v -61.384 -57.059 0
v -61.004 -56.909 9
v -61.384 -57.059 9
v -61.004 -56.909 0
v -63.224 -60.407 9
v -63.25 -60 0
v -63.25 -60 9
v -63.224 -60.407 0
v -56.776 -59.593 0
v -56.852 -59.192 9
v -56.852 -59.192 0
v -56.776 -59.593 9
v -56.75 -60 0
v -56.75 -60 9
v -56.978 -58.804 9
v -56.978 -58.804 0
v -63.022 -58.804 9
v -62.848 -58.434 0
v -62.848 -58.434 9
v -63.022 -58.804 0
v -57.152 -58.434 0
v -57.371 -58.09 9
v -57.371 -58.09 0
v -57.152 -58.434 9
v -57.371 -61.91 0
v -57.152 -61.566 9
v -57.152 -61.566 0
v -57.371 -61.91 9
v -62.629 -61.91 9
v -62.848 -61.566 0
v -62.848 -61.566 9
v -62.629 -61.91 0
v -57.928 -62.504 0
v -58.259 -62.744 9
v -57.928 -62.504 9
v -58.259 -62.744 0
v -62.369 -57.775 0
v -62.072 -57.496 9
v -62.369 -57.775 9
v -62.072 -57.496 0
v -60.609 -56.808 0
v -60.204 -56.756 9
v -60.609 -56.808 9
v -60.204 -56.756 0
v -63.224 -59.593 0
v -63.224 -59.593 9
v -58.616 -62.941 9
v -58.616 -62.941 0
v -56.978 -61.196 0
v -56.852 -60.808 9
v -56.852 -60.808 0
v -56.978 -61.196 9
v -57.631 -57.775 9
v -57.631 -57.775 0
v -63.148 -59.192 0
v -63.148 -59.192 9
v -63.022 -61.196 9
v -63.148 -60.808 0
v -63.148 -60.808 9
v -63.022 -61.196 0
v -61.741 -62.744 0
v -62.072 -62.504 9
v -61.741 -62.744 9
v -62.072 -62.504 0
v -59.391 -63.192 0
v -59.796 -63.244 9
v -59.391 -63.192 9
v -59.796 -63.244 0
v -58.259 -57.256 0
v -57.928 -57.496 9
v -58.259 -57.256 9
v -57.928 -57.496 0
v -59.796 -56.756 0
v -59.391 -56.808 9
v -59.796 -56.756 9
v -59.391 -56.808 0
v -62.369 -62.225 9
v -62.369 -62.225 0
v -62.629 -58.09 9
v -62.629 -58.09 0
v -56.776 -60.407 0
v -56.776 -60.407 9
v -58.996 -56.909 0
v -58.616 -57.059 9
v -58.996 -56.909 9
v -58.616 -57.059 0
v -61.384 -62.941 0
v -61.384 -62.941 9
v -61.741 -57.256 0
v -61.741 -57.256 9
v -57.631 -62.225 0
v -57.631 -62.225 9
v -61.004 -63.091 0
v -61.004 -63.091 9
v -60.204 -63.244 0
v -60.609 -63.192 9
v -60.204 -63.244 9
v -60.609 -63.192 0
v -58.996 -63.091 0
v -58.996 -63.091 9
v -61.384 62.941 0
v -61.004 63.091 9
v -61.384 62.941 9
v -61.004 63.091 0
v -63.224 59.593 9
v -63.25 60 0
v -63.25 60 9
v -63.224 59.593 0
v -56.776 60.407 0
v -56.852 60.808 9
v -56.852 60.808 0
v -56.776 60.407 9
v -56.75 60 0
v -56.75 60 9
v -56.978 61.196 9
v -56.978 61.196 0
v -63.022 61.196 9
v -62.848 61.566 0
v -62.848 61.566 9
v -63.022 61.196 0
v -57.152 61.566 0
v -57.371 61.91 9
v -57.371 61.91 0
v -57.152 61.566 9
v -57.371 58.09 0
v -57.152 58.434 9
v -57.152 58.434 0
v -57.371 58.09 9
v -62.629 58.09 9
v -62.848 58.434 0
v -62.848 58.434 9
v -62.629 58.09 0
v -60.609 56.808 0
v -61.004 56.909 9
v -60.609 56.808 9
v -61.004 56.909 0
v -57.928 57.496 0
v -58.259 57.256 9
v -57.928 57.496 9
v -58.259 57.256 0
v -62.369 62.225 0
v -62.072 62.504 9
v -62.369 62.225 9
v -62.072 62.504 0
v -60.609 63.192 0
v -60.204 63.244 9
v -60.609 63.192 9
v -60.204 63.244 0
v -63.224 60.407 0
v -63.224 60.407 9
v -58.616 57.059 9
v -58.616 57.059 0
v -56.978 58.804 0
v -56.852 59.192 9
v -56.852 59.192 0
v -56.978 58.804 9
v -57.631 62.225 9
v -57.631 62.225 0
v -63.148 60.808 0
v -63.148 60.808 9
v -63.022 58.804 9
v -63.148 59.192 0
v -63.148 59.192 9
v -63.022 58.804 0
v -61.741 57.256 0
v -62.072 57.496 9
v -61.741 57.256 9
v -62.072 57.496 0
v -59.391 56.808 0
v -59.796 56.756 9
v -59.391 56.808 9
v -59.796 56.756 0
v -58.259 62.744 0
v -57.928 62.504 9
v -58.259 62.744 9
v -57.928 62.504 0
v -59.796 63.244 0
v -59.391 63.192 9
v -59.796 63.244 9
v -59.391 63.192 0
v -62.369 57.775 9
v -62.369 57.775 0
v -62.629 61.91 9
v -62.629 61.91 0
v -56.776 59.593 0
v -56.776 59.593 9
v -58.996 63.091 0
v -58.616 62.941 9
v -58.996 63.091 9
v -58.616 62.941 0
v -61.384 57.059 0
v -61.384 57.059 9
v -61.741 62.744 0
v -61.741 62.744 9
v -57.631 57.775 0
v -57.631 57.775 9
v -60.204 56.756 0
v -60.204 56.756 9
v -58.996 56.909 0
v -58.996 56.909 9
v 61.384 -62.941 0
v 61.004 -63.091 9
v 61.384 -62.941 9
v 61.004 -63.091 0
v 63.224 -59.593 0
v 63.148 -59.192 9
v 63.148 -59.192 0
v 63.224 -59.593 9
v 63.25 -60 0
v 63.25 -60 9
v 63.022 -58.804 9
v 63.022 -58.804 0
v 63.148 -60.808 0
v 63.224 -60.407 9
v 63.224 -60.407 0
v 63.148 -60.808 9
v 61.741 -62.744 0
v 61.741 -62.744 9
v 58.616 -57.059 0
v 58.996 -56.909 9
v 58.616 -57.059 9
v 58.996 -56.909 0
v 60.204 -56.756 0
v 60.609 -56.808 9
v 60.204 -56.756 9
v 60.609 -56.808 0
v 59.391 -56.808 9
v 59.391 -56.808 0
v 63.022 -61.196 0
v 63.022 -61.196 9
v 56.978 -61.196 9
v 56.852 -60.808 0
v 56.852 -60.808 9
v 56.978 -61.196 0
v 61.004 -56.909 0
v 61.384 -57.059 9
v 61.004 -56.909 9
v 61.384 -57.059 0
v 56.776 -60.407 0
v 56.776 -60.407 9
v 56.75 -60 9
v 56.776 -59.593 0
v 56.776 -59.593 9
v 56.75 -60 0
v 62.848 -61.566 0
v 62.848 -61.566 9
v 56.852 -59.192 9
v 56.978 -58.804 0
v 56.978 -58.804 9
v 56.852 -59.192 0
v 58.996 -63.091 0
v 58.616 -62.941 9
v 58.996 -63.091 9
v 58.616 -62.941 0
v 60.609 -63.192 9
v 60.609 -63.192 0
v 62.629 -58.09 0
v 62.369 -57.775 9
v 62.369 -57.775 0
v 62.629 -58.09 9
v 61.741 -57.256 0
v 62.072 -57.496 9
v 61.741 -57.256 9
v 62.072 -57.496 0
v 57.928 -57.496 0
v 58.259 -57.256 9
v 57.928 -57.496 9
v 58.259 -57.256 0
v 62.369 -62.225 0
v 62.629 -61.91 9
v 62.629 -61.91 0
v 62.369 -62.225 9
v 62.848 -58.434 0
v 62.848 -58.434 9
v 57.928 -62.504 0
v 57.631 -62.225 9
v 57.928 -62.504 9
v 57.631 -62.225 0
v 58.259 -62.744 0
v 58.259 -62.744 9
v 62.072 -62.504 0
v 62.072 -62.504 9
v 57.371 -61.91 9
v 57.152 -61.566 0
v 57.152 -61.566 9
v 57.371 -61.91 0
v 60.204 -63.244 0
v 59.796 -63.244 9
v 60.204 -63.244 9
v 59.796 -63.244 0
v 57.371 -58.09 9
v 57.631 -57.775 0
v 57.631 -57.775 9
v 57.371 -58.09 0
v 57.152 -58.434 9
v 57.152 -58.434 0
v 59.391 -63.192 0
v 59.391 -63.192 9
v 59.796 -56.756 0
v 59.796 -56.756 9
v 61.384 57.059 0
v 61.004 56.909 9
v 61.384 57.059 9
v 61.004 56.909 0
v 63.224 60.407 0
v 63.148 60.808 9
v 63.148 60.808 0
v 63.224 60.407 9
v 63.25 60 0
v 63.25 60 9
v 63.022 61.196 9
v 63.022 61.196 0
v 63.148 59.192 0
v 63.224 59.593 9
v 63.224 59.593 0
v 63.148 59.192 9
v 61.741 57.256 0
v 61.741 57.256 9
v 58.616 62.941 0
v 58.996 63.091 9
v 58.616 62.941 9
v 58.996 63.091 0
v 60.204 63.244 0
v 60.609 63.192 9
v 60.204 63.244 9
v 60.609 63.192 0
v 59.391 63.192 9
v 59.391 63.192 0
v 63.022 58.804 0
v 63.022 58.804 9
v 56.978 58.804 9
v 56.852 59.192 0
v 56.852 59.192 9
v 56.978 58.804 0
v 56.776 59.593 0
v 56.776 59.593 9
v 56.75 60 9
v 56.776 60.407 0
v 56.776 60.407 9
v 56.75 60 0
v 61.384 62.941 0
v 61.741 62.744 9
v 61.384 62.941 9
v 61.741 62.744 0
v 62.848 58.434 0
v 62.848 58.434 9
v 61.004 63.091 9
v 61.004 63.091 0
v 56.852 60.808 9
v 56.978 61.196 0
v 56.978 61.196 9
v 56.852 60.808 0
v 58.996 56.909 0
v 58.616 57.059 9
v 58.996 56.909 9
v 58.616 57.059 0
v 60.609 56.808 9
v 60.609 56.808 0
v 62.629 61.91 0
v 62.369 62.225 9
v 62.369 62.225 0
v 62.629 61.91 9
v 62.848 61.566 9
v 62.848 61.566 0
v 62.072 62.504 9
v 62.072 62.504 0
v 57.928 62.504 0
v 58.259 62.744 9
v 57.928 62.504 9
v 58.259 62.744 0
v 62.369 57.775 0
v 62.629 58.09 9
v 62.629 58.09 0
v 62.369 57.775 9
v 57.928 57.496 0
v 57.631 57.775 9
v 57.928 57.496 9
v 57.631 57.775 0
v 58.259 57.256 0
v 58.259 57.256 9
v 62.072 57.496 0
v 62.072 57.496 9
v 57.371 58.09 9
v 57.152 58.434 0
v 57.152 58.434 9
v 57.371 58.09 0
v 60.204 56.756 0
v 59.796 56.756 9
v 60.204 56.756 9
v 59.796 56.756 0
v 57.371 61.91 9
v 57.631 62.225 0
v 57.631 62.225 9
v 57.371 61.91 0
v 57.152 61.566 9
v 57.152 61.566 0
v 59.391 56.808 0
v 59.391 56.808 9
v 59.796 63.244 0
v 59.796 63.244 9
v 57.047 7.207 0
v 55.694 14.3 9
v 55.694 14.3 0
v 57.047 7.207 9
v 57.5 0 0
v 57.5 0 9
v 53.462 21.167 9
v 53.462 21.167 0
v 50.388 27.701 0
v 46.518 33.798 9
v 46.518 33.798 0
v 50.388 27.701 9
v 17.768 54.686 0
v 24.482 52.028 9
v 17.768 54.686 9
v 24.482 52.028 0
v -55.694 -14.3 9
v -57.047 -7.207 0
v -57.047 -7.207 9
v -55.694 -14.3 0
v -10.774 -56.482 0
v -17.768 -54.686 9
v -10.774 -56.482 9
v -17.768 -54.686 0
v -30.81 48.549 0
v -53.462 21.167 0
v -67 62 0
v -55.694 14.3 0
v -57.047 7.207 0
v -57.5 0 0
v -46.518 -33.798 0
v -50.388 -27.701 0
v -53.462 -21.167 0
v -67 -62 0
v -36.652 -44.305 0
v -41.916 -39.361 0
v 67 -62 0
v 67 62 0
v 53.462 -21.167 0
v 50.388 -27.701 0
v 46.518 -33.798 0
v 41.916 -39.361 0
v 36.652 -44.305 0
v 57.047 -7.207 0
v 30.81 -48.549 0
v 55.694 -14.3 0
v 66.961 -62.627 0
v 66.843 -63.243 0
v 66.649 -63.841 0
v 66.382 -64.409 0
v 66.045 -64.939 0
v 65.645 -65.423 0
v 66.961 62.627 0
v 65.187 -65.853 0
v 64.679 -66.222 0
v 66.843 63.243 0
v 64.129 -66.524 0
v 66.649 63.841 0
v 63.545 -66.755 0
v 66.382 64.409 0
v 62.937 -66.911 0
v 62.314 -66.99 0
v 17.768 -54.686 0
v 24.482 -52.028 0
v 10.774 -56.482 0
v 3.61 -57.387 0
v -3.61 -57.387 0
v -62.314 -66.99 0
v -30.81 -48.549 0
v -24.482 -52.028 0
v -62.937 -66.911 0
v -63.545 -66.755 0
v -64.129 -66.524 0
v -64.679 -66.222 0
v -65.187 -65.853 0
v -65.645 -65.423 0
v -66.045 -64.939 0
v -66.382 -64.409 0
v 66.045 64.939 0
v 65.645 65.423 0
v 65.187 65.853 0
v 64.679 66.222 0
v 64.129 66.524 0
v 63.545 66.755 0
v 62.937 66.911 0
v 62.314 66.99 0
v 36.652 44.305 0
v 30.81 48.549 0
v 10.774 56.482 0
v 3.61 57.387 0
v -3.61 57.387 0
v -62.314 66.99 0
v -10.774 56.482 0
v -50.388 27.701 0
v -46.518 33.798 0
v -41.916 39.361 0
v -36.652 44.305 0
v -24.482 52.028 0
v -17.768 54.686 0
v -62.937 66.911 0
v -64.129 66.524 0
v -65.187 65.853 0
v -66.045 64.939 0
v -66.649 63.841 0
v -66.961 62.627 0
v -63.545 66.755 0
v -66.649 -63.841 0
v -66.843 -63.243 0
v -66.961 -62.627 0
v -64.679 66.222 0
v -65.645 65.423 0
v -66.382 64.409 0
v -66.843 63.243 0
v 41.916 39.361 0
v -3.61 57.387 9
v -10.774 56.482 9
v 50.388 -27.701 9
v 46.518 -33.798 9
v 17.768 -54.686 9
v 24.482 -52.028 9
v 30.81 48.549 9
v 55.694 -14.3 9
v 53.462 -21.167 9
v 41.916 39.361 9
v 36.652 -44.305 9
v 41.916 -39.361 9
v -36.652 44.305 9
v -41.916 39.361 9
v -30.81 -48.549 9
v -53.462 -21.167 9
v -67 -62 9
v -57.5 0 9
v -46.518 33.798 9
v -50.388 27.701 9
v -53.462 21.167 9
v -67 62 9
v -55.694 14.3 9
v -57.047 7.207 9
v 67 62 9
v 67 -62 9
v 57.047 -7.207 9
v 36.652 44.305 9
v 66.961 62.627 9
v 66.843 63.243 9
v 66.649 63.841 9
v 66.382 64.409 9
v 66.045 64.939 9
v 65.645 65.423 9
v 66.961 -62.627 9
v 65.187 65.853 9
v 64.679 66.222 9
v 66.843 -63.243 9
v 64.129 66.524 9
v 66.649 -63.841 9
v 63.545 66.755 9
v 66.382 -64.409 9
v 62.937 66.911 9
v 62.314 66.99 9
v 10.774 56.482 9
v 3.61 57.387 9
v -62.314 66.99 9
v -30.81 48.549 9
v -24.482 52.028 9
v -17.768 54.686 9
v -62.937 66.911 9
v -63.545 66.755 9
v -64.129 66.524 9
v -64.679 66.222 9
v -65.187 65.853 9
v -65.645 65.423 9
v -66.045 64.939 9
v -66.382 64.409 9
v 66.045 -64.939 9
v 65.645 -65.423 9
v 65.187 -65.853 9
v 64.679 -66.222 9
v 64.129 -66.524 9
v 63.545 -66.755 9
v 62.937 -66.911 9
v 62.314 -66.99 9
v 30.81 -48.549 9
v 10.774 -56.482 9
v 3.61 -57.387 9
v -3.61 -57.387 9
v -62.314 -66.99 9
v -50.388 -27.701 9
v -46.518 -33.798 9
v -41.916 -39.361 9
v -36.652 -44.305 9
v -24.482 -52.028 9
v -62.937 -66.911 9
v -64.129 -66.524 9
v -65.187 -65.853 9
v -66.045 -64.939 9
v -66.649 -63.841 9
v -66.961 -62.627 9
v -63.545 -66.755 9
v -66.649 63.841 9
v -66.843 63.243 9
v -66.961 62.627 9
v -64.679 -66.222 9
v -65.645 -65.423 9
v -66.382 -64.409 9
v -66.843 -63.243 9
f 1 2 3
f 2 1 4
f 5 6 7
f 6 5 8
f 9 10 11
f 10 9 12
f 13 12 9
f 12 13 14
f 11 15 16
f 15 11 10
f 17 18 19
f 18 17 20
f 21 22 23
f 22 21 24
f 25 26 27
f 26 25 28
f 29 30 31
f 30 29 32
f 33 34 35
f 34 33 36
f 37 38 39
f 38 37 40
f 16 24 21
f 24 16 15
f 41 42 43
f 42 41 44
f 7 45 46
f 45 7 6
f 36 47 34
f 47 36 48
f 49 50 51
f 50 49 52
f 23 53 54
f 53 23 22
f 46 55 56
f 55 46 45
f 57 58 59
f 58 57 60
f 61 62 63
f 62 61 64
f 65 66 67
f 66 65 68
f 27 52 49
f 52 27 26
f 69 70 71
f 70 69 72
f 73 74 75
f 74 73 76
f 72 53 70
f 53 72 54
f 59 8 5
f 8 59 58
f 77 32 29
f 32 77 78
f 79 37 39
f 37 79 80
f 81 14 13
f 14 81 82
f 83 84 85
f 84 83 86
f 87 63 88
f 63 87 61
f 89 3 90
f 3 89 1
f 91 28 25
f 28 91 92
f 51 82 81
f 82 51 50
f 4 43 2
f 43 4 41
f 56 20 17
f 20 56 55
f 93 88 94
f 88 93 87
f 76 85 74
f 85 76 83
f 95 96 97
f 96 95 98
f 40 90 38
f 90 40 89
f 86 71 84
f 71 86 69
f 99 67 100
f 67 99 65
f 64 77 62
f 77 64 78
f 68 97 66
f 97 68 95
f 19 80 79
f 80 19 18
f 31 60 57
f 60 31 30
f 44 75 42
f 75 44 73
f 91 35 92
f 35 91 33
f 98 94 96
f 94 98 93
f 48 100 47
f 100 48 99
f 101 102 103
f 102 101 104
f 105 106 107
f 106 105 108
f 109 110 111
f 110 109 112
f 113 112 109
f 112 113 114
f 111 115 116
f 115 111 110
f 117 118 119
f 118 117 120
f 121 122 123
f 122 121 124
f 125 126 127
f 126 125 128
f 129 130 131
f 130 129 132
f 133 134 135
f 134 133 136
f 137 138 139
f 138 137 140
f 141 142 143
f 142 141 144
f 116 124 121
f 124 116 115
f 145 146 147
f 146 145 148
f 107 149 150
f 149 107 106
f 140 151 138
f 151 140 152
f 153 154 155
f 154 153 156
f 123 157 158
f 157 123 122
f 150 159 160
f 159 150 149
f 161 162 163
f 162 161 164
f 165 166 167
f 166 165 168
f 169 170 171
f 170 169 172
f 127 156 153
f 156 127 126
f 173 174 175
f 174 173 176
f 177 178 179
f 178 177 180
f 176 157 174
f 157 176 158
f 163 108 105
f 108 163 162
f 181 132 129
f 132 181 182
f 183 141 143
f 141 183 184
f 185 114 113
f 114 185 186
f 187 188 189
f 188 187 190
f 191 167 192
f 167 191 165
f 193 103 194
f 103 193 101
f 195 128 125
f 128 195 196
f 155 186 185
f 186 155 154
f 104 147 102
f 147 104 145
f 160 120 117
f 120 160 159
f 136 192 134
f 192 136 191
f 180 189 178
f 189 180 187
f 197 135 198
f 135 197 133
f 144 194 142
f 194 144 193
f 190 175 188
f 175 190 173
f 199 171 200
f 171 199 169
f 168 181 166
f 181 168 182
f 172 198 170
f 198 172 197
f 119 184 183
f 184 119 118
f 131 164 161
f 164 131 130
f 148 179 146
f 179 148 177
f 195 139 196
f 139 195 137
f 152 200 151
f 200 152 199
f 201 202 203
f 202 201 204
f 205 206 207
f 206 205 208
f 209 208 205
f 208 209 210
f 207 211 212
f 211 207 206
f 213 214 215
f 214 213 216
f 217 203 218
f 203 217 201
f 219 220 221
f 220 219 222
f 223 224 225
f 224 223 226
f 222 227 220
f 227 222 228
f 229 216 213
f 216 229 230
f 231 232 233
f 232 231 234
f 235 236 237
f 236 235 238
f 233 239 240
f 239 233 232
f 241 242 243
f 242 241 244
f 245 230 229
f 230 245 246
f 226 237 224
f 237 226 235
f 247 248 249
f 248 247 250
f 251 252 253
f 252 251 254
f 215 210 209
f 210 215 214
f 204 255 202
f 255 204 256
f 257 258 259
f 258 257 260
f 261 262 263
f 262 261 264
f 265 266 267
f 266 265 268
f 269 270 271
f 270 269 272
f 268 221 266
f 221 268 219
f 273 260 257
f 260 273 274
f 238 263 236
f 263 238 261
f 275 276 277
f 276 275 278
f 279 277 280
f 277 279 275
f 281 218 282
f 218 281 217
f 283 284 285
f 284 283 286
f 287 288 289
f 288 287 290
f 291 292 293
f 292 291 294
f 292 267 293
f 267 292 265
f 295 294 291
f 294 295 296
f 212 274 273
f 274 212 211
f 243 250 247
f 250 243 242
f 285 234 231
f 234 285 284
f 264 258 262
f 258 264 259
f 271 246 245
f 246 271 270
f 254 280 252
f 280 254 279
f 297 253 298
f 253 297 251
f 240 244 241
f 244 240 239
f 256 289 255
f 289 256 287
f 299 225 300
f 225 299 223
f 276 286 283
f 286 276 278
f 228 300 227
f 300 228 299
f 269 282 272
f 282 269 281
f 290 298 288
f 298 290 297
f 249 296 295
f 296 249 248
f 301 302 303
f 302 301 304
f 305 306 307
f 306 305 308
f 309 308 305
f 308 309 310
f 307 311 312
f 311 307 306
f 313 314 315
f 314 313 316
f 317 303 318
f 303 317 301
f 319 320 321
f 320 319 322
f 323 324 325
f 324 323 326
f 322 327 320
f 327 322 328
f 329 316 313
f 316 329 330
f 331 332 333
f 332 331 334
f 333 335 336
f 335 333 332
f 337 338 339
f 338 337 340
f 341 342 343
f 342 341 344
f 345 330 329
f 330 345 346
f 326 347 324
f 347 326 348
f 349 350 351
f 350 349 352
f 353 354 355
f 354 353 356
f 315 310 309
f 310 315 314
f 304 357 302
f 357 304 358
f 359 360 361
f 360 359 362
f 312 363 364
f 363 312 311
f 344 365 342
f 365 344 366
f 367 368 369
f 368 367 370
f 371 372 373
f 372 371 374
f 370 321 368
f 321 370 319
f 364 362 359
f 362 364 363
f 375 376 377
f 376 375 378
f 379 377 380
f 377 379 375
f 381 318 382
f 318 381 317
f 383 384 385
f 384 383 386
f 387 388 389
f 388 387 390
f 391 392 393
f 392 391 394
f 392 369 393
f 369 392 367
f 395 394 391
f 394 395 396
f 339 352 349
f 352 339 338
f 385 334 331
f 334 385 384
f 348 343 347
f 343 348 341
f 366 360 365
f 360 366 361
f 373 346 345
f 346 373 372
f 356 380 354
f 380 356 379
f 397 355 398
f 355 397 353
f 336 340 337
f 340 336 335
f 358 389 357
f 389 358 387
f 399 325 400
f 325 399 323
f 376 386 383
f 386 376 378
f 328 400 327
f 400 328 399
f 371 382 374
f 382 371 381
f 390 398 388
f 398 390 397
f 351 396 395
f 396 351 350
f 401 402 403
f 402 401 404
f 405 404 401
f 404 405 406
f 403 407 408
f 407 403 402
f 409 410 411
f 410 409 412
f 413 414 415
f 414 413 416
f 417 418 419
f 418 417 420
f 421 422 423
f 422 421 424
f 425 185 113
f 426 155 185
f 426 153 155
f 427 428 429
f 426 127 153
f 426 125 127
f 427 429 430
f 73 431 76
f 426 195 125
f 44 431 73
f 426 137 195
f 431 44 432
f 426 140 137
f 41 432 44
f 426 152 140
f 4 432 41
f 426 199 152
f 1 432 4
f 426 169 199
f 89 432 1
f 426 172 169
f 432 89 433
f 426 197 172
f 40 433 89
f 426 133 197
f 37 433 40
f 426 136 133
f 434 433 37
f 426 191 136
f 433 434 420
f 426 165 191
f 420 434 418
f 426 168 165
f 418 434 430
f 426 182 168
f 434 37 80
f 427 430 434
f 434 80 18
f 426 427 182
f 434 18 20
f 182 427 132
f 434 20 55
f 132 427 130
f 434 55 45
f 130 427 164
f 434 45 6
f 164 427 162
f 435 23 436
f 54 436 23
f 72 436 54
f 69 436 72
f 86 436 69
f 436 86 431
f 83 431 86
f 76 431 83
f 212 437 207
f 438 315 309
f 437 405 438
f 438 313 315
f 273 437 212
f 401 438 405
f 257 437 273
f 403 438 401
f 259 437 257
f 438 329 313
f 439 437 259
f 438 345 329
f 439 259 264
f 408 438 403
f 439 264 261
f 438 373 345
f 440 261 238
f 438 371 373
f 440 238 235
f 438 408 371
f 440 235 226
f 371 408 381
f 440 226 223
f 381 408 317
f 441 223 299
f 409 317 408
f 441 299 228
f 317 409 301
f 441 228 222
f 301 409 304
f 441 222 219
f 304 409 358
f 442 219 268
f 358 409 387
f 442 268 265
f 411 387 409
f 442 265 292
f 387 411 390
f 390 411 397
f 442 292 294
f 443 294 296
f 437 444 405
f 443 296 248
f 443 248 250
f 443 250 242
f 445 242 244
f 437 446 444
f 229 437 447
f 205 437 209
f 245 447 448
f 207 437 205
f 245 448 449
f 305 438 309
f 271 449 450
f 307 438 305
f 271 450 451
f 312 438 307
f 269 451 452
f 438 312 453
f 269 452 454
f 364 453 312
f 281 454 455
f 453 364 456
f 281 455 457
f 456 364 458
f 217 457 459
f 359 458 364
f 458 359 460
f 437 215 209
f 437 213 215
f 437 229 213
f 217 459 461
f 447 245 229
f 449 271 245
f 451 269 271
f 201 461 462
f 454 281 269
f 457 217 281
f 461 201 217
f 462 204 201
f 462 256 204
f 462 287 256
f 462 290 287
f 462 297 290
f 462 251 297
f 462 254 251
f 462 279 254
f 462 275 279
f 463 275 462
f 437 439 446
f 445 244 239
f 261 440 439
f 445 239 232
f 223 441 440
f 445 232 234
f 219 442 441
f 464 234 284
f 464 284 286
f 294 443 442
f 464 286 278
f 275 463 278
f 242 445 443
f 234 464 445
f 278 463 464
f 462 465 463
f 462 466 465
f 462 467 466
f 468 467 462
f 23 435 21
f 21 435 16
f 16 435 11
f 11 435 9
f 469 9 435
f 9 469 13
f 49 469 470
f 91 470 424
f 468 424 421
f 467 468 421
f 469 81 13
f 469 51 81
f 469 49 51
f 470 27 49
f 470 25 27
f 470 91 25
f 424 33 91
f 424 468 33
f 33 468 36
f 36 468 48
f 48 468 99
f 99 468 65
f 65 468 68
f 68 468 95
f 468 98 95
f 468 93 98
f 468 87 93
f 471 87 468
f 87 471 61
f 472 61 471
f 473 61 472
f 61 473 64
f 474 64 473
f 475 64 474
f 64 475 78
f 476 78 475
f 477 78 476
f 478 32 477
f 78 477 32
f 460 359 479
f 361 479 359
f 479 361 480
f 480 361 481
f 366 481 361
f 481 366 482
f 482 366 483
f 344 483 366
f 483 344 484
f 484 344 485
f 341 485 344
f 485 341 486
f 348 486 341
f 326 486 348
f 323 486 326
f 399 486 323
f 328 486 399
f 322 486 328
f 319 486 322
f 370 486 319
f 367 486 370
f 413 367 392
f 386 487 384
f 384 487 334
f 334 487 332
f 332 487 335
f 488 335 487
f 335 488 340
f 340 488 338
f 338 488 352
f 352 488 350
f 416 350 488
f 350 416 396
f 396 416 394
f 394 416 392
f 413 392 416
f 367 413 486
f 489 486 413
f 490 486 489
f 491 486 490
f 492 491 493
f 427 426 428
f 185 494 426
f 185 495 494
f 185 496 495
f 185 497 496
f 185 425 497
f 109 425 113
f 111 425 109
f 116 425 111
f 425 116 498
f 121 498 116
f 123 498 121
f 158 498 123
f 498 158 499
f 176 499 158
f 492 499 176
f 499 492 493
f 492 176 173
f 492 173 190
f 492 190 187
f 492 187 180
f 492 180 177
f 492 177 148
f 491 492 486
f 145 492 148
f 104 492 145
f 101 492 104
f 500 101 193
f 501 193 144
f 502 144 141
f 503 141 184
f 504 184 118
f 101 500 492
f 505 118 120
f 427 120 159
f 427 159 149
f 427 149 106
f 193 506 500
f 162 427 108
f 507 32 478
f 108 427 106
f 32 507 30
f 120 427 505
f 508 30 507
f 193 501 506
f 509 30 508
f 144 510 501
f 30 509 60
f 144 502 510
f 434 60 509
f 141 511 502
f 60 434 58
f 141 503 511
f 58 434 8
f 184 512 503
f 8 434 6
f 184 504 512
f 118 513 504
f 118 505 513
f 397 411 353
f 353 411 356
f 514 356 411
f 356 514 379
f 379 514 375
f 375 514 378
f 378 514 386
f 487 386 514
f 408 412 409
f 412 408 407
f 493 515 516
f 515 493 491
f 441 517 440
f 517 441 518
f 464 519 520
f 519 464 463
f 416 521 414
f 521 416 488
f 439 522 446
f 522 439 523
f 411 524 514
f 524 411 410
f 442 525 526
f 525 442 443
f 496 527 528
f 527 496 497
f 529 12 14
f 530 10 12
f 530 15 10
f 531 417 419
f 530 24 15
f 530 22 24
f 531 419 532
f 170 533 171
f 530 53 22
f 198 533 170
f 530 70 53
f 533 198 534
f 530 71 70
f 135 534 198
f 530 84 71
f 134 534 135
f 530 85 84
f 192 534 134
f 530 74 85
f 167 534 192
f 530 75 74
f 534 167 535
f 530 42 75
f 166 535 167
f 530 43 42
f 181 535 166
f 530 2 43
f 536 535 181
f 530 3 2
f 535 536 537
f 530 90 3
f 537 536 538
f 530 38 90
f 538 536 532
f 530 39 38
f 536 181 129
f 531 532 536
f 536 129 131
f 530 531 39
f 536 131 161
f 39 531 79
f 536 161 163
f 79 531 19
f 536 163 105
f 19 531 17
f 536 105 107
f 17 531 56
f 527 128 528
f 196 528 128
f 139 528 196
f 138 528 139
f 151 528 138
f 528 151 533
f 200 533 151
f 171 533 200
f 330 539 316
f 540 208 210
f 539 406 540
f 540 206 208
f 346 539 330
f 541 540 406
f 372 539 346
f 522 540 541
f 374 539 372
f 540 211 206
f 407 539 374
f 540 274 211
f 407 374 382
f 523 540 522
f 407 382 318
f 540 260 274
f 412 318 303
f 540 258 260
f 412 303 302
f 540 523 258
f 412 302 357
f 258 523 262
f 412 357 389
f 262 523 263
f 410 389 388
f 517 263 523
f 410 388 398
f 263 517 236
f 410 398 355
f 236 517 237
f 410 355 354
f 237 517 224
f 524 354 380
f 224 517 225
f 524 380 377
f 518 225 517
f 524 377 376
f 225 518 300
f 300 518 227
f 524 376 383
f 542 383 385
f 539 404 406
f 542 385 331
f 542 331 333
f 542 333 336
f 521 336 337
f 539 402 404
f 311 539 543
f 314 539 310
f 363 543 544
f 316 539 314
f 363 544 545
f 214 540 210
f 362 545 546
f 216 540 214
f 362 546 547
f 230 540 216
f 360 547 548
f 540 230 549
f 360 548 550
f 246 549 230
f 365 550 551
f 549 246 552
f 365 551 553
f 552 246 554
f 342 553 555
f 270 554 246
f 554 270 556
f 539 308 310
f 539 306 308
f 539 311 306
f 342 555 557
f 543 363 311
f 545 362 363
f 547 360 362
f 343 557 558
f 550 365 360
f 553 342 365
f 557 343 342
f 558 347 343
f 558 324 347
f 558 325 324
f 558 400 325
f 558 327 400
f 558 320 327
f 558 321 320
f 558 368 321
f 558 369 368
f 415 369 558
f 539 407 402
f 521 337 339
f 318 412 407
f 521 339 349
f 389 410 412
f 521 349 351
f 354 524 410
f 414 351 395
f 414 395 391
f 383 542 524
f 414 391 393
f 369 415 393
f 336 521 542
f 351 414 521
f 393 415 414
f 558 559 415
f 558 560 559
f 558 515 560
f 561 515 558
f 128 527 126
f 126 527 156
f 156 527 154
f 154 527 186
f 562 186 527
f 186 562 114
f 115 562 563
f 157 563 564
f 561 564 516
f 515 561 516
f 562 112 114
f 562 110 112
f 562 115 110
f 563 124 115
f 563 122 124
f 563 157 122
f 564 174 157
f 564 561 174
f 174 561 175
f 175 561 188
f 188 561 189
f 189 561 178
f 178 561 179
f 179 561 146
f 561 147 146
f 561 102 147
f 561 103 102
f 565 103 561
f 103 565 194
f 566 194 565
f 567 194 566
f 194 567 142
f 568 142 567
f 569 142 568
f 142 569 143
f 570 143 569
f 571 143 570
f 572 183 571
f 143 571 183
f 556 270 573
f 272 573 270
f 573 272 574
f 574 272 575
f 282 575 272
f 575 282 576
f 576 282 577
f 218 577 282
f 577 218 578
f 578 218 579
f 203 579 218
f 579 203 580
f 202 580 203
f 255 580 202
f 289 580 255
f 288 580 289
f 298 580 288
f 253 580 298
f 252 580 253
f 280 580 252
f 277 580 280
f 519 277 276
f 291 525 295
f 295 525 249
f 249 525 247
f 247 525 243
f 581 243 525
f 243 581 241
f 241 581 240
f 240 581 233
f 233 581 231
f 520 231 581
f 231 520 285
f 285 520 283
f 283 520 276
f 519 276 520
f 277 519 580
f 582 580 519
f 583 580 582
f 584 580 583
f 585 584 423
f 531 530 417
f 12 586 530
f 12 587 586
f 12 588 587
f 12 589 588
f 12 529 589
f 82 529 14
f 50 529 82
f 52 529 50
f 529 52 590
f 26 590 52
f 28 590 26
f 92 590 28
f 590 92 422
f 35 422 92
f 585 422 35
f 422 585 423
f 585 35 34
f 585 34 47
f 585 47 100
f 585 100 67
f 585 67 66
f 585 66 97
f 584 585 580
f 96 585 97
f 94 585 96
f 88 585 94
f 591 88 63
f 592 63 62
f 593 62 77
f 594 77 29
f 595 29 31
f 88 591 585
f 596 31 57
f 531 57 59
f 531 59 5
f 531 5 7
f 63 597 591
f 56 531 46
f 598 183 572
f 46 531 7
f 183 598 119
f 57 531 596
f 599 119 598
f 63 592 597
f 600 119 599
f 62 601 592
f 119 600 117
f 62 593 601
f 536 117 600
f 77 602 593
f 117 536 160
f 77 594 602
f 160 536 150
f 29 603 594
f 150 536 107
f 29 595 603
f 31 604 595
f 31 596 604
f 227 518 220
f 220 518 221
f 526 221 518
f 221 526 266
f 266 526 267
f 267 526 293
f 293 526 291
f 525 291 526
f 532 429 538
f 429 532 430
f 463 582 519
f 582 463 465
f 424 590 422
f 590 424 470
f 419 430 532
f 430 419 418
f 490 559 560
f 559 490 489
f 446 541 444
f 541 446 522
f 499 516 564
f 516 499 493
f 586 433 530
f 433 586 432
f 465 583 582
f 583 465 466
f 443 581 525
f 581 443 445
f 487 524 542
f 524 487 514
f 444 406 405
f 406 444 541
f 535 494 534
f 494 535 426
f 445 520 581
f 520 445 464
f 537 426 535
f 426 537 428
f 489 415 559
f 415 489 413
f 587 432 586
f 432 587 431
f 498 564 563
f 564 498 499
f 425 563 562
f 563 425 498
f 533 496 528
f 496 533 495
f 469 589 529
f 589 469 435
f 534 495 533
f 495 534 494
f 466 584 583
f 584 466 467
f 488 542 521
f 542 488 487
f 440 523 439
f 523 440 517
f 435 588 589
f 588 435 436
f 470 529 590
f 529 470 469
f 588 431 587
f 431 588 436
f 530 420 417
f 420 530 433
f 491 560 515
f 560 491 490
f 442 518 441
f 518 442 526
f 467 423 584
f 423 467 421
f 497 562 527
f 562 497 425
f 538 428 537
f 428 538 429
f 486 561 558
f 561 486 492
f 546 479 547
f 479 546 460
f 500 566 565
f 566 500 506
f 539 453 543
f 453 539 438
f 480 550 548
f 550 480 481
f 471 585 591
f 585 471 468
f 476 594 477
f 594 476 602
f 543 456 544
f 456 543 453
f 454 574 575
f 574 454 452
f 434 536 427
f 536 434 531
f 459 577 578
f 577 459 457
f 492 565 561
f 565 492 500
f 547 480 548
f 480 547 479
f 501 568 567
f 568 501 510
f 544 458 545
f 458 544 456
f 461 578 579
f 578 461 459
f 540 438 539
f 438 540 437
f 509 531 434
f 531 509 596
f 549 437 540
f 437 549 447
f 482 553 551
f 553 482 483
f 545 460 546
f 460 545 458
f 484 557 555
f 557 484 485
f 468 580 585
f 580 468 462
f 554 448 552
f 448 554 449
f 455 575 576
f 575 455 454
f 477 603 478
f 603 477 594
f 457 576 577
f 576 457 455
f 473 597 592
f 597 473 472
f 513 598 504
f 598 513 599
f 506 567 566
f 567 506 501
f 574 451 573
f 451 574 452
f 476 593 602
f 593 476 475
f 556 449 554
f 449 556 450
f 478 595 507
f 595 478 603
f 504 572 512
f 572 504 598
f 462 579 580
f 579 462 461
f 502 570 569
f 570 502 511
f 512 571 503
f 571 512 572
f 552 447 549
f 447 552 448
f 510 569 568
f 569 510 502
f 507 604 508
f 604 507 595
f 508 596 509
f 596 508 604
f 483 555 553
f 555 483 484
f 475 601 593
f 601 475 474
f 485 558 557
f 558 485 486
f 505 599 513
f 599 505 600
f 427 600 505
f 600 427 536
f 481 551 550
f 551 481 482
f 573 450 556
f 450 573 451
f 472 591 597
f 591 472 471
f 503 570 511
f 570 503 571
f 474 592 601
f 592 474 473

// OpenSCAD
$fn = 50;

difference() {
	union() {
		hull() {
			translate(v = [-62.0, 62.0, 0]) {
				cylinder(h = 9, r = 5);
			}
			translate(v = [62.0, 62.0, 0]) {
				cylinder(h = 9, r = 5);
			}
			translate(v = [-62.0, -62.0, 0]) {
				cylinder(h = 9, r = 5);
			}
			translate(v = [62.0, -62.0, 0]) {
				cylinder(h = 9, r = 5);
			}
		}
	}
	union() {
		translate(v = [-60.0, -60.0, -100.0]) {
			cylinder(h = 200, r = 3.25);
		}
		translate(v = [-60.0, 60.0, -100.0]) {
			cylinder(h = 200, r = 3.25);
		}
		translate(v = [60.0, -60.0, -100.0]) {
			cylinder(h = 200, r = 3.25);
		}
		translate(v = [60.0, 60.0, -100.0]) {
			cylinder(h = 200, r = 3.25);
		}
		translate(v = [-60.0, -60.0, -100.0]) {
			cylinder(h = 200, r = 1.8);
		}
		translate(v = [-60.0, 60.0, -100.0]) {
			cylinder(h = 200, r = 1.8);
		}
		translate(v = [60.0, -60.0, -100.0]) {
			cylinder(h = 200, r = 1.8);
		}
		translate(v = [60.0, 60.0, -100.0]) {
			cylinder(h = 200, r = 1.8);
		}
		cylinder(h = 9, r = 57.5);
	}
}
